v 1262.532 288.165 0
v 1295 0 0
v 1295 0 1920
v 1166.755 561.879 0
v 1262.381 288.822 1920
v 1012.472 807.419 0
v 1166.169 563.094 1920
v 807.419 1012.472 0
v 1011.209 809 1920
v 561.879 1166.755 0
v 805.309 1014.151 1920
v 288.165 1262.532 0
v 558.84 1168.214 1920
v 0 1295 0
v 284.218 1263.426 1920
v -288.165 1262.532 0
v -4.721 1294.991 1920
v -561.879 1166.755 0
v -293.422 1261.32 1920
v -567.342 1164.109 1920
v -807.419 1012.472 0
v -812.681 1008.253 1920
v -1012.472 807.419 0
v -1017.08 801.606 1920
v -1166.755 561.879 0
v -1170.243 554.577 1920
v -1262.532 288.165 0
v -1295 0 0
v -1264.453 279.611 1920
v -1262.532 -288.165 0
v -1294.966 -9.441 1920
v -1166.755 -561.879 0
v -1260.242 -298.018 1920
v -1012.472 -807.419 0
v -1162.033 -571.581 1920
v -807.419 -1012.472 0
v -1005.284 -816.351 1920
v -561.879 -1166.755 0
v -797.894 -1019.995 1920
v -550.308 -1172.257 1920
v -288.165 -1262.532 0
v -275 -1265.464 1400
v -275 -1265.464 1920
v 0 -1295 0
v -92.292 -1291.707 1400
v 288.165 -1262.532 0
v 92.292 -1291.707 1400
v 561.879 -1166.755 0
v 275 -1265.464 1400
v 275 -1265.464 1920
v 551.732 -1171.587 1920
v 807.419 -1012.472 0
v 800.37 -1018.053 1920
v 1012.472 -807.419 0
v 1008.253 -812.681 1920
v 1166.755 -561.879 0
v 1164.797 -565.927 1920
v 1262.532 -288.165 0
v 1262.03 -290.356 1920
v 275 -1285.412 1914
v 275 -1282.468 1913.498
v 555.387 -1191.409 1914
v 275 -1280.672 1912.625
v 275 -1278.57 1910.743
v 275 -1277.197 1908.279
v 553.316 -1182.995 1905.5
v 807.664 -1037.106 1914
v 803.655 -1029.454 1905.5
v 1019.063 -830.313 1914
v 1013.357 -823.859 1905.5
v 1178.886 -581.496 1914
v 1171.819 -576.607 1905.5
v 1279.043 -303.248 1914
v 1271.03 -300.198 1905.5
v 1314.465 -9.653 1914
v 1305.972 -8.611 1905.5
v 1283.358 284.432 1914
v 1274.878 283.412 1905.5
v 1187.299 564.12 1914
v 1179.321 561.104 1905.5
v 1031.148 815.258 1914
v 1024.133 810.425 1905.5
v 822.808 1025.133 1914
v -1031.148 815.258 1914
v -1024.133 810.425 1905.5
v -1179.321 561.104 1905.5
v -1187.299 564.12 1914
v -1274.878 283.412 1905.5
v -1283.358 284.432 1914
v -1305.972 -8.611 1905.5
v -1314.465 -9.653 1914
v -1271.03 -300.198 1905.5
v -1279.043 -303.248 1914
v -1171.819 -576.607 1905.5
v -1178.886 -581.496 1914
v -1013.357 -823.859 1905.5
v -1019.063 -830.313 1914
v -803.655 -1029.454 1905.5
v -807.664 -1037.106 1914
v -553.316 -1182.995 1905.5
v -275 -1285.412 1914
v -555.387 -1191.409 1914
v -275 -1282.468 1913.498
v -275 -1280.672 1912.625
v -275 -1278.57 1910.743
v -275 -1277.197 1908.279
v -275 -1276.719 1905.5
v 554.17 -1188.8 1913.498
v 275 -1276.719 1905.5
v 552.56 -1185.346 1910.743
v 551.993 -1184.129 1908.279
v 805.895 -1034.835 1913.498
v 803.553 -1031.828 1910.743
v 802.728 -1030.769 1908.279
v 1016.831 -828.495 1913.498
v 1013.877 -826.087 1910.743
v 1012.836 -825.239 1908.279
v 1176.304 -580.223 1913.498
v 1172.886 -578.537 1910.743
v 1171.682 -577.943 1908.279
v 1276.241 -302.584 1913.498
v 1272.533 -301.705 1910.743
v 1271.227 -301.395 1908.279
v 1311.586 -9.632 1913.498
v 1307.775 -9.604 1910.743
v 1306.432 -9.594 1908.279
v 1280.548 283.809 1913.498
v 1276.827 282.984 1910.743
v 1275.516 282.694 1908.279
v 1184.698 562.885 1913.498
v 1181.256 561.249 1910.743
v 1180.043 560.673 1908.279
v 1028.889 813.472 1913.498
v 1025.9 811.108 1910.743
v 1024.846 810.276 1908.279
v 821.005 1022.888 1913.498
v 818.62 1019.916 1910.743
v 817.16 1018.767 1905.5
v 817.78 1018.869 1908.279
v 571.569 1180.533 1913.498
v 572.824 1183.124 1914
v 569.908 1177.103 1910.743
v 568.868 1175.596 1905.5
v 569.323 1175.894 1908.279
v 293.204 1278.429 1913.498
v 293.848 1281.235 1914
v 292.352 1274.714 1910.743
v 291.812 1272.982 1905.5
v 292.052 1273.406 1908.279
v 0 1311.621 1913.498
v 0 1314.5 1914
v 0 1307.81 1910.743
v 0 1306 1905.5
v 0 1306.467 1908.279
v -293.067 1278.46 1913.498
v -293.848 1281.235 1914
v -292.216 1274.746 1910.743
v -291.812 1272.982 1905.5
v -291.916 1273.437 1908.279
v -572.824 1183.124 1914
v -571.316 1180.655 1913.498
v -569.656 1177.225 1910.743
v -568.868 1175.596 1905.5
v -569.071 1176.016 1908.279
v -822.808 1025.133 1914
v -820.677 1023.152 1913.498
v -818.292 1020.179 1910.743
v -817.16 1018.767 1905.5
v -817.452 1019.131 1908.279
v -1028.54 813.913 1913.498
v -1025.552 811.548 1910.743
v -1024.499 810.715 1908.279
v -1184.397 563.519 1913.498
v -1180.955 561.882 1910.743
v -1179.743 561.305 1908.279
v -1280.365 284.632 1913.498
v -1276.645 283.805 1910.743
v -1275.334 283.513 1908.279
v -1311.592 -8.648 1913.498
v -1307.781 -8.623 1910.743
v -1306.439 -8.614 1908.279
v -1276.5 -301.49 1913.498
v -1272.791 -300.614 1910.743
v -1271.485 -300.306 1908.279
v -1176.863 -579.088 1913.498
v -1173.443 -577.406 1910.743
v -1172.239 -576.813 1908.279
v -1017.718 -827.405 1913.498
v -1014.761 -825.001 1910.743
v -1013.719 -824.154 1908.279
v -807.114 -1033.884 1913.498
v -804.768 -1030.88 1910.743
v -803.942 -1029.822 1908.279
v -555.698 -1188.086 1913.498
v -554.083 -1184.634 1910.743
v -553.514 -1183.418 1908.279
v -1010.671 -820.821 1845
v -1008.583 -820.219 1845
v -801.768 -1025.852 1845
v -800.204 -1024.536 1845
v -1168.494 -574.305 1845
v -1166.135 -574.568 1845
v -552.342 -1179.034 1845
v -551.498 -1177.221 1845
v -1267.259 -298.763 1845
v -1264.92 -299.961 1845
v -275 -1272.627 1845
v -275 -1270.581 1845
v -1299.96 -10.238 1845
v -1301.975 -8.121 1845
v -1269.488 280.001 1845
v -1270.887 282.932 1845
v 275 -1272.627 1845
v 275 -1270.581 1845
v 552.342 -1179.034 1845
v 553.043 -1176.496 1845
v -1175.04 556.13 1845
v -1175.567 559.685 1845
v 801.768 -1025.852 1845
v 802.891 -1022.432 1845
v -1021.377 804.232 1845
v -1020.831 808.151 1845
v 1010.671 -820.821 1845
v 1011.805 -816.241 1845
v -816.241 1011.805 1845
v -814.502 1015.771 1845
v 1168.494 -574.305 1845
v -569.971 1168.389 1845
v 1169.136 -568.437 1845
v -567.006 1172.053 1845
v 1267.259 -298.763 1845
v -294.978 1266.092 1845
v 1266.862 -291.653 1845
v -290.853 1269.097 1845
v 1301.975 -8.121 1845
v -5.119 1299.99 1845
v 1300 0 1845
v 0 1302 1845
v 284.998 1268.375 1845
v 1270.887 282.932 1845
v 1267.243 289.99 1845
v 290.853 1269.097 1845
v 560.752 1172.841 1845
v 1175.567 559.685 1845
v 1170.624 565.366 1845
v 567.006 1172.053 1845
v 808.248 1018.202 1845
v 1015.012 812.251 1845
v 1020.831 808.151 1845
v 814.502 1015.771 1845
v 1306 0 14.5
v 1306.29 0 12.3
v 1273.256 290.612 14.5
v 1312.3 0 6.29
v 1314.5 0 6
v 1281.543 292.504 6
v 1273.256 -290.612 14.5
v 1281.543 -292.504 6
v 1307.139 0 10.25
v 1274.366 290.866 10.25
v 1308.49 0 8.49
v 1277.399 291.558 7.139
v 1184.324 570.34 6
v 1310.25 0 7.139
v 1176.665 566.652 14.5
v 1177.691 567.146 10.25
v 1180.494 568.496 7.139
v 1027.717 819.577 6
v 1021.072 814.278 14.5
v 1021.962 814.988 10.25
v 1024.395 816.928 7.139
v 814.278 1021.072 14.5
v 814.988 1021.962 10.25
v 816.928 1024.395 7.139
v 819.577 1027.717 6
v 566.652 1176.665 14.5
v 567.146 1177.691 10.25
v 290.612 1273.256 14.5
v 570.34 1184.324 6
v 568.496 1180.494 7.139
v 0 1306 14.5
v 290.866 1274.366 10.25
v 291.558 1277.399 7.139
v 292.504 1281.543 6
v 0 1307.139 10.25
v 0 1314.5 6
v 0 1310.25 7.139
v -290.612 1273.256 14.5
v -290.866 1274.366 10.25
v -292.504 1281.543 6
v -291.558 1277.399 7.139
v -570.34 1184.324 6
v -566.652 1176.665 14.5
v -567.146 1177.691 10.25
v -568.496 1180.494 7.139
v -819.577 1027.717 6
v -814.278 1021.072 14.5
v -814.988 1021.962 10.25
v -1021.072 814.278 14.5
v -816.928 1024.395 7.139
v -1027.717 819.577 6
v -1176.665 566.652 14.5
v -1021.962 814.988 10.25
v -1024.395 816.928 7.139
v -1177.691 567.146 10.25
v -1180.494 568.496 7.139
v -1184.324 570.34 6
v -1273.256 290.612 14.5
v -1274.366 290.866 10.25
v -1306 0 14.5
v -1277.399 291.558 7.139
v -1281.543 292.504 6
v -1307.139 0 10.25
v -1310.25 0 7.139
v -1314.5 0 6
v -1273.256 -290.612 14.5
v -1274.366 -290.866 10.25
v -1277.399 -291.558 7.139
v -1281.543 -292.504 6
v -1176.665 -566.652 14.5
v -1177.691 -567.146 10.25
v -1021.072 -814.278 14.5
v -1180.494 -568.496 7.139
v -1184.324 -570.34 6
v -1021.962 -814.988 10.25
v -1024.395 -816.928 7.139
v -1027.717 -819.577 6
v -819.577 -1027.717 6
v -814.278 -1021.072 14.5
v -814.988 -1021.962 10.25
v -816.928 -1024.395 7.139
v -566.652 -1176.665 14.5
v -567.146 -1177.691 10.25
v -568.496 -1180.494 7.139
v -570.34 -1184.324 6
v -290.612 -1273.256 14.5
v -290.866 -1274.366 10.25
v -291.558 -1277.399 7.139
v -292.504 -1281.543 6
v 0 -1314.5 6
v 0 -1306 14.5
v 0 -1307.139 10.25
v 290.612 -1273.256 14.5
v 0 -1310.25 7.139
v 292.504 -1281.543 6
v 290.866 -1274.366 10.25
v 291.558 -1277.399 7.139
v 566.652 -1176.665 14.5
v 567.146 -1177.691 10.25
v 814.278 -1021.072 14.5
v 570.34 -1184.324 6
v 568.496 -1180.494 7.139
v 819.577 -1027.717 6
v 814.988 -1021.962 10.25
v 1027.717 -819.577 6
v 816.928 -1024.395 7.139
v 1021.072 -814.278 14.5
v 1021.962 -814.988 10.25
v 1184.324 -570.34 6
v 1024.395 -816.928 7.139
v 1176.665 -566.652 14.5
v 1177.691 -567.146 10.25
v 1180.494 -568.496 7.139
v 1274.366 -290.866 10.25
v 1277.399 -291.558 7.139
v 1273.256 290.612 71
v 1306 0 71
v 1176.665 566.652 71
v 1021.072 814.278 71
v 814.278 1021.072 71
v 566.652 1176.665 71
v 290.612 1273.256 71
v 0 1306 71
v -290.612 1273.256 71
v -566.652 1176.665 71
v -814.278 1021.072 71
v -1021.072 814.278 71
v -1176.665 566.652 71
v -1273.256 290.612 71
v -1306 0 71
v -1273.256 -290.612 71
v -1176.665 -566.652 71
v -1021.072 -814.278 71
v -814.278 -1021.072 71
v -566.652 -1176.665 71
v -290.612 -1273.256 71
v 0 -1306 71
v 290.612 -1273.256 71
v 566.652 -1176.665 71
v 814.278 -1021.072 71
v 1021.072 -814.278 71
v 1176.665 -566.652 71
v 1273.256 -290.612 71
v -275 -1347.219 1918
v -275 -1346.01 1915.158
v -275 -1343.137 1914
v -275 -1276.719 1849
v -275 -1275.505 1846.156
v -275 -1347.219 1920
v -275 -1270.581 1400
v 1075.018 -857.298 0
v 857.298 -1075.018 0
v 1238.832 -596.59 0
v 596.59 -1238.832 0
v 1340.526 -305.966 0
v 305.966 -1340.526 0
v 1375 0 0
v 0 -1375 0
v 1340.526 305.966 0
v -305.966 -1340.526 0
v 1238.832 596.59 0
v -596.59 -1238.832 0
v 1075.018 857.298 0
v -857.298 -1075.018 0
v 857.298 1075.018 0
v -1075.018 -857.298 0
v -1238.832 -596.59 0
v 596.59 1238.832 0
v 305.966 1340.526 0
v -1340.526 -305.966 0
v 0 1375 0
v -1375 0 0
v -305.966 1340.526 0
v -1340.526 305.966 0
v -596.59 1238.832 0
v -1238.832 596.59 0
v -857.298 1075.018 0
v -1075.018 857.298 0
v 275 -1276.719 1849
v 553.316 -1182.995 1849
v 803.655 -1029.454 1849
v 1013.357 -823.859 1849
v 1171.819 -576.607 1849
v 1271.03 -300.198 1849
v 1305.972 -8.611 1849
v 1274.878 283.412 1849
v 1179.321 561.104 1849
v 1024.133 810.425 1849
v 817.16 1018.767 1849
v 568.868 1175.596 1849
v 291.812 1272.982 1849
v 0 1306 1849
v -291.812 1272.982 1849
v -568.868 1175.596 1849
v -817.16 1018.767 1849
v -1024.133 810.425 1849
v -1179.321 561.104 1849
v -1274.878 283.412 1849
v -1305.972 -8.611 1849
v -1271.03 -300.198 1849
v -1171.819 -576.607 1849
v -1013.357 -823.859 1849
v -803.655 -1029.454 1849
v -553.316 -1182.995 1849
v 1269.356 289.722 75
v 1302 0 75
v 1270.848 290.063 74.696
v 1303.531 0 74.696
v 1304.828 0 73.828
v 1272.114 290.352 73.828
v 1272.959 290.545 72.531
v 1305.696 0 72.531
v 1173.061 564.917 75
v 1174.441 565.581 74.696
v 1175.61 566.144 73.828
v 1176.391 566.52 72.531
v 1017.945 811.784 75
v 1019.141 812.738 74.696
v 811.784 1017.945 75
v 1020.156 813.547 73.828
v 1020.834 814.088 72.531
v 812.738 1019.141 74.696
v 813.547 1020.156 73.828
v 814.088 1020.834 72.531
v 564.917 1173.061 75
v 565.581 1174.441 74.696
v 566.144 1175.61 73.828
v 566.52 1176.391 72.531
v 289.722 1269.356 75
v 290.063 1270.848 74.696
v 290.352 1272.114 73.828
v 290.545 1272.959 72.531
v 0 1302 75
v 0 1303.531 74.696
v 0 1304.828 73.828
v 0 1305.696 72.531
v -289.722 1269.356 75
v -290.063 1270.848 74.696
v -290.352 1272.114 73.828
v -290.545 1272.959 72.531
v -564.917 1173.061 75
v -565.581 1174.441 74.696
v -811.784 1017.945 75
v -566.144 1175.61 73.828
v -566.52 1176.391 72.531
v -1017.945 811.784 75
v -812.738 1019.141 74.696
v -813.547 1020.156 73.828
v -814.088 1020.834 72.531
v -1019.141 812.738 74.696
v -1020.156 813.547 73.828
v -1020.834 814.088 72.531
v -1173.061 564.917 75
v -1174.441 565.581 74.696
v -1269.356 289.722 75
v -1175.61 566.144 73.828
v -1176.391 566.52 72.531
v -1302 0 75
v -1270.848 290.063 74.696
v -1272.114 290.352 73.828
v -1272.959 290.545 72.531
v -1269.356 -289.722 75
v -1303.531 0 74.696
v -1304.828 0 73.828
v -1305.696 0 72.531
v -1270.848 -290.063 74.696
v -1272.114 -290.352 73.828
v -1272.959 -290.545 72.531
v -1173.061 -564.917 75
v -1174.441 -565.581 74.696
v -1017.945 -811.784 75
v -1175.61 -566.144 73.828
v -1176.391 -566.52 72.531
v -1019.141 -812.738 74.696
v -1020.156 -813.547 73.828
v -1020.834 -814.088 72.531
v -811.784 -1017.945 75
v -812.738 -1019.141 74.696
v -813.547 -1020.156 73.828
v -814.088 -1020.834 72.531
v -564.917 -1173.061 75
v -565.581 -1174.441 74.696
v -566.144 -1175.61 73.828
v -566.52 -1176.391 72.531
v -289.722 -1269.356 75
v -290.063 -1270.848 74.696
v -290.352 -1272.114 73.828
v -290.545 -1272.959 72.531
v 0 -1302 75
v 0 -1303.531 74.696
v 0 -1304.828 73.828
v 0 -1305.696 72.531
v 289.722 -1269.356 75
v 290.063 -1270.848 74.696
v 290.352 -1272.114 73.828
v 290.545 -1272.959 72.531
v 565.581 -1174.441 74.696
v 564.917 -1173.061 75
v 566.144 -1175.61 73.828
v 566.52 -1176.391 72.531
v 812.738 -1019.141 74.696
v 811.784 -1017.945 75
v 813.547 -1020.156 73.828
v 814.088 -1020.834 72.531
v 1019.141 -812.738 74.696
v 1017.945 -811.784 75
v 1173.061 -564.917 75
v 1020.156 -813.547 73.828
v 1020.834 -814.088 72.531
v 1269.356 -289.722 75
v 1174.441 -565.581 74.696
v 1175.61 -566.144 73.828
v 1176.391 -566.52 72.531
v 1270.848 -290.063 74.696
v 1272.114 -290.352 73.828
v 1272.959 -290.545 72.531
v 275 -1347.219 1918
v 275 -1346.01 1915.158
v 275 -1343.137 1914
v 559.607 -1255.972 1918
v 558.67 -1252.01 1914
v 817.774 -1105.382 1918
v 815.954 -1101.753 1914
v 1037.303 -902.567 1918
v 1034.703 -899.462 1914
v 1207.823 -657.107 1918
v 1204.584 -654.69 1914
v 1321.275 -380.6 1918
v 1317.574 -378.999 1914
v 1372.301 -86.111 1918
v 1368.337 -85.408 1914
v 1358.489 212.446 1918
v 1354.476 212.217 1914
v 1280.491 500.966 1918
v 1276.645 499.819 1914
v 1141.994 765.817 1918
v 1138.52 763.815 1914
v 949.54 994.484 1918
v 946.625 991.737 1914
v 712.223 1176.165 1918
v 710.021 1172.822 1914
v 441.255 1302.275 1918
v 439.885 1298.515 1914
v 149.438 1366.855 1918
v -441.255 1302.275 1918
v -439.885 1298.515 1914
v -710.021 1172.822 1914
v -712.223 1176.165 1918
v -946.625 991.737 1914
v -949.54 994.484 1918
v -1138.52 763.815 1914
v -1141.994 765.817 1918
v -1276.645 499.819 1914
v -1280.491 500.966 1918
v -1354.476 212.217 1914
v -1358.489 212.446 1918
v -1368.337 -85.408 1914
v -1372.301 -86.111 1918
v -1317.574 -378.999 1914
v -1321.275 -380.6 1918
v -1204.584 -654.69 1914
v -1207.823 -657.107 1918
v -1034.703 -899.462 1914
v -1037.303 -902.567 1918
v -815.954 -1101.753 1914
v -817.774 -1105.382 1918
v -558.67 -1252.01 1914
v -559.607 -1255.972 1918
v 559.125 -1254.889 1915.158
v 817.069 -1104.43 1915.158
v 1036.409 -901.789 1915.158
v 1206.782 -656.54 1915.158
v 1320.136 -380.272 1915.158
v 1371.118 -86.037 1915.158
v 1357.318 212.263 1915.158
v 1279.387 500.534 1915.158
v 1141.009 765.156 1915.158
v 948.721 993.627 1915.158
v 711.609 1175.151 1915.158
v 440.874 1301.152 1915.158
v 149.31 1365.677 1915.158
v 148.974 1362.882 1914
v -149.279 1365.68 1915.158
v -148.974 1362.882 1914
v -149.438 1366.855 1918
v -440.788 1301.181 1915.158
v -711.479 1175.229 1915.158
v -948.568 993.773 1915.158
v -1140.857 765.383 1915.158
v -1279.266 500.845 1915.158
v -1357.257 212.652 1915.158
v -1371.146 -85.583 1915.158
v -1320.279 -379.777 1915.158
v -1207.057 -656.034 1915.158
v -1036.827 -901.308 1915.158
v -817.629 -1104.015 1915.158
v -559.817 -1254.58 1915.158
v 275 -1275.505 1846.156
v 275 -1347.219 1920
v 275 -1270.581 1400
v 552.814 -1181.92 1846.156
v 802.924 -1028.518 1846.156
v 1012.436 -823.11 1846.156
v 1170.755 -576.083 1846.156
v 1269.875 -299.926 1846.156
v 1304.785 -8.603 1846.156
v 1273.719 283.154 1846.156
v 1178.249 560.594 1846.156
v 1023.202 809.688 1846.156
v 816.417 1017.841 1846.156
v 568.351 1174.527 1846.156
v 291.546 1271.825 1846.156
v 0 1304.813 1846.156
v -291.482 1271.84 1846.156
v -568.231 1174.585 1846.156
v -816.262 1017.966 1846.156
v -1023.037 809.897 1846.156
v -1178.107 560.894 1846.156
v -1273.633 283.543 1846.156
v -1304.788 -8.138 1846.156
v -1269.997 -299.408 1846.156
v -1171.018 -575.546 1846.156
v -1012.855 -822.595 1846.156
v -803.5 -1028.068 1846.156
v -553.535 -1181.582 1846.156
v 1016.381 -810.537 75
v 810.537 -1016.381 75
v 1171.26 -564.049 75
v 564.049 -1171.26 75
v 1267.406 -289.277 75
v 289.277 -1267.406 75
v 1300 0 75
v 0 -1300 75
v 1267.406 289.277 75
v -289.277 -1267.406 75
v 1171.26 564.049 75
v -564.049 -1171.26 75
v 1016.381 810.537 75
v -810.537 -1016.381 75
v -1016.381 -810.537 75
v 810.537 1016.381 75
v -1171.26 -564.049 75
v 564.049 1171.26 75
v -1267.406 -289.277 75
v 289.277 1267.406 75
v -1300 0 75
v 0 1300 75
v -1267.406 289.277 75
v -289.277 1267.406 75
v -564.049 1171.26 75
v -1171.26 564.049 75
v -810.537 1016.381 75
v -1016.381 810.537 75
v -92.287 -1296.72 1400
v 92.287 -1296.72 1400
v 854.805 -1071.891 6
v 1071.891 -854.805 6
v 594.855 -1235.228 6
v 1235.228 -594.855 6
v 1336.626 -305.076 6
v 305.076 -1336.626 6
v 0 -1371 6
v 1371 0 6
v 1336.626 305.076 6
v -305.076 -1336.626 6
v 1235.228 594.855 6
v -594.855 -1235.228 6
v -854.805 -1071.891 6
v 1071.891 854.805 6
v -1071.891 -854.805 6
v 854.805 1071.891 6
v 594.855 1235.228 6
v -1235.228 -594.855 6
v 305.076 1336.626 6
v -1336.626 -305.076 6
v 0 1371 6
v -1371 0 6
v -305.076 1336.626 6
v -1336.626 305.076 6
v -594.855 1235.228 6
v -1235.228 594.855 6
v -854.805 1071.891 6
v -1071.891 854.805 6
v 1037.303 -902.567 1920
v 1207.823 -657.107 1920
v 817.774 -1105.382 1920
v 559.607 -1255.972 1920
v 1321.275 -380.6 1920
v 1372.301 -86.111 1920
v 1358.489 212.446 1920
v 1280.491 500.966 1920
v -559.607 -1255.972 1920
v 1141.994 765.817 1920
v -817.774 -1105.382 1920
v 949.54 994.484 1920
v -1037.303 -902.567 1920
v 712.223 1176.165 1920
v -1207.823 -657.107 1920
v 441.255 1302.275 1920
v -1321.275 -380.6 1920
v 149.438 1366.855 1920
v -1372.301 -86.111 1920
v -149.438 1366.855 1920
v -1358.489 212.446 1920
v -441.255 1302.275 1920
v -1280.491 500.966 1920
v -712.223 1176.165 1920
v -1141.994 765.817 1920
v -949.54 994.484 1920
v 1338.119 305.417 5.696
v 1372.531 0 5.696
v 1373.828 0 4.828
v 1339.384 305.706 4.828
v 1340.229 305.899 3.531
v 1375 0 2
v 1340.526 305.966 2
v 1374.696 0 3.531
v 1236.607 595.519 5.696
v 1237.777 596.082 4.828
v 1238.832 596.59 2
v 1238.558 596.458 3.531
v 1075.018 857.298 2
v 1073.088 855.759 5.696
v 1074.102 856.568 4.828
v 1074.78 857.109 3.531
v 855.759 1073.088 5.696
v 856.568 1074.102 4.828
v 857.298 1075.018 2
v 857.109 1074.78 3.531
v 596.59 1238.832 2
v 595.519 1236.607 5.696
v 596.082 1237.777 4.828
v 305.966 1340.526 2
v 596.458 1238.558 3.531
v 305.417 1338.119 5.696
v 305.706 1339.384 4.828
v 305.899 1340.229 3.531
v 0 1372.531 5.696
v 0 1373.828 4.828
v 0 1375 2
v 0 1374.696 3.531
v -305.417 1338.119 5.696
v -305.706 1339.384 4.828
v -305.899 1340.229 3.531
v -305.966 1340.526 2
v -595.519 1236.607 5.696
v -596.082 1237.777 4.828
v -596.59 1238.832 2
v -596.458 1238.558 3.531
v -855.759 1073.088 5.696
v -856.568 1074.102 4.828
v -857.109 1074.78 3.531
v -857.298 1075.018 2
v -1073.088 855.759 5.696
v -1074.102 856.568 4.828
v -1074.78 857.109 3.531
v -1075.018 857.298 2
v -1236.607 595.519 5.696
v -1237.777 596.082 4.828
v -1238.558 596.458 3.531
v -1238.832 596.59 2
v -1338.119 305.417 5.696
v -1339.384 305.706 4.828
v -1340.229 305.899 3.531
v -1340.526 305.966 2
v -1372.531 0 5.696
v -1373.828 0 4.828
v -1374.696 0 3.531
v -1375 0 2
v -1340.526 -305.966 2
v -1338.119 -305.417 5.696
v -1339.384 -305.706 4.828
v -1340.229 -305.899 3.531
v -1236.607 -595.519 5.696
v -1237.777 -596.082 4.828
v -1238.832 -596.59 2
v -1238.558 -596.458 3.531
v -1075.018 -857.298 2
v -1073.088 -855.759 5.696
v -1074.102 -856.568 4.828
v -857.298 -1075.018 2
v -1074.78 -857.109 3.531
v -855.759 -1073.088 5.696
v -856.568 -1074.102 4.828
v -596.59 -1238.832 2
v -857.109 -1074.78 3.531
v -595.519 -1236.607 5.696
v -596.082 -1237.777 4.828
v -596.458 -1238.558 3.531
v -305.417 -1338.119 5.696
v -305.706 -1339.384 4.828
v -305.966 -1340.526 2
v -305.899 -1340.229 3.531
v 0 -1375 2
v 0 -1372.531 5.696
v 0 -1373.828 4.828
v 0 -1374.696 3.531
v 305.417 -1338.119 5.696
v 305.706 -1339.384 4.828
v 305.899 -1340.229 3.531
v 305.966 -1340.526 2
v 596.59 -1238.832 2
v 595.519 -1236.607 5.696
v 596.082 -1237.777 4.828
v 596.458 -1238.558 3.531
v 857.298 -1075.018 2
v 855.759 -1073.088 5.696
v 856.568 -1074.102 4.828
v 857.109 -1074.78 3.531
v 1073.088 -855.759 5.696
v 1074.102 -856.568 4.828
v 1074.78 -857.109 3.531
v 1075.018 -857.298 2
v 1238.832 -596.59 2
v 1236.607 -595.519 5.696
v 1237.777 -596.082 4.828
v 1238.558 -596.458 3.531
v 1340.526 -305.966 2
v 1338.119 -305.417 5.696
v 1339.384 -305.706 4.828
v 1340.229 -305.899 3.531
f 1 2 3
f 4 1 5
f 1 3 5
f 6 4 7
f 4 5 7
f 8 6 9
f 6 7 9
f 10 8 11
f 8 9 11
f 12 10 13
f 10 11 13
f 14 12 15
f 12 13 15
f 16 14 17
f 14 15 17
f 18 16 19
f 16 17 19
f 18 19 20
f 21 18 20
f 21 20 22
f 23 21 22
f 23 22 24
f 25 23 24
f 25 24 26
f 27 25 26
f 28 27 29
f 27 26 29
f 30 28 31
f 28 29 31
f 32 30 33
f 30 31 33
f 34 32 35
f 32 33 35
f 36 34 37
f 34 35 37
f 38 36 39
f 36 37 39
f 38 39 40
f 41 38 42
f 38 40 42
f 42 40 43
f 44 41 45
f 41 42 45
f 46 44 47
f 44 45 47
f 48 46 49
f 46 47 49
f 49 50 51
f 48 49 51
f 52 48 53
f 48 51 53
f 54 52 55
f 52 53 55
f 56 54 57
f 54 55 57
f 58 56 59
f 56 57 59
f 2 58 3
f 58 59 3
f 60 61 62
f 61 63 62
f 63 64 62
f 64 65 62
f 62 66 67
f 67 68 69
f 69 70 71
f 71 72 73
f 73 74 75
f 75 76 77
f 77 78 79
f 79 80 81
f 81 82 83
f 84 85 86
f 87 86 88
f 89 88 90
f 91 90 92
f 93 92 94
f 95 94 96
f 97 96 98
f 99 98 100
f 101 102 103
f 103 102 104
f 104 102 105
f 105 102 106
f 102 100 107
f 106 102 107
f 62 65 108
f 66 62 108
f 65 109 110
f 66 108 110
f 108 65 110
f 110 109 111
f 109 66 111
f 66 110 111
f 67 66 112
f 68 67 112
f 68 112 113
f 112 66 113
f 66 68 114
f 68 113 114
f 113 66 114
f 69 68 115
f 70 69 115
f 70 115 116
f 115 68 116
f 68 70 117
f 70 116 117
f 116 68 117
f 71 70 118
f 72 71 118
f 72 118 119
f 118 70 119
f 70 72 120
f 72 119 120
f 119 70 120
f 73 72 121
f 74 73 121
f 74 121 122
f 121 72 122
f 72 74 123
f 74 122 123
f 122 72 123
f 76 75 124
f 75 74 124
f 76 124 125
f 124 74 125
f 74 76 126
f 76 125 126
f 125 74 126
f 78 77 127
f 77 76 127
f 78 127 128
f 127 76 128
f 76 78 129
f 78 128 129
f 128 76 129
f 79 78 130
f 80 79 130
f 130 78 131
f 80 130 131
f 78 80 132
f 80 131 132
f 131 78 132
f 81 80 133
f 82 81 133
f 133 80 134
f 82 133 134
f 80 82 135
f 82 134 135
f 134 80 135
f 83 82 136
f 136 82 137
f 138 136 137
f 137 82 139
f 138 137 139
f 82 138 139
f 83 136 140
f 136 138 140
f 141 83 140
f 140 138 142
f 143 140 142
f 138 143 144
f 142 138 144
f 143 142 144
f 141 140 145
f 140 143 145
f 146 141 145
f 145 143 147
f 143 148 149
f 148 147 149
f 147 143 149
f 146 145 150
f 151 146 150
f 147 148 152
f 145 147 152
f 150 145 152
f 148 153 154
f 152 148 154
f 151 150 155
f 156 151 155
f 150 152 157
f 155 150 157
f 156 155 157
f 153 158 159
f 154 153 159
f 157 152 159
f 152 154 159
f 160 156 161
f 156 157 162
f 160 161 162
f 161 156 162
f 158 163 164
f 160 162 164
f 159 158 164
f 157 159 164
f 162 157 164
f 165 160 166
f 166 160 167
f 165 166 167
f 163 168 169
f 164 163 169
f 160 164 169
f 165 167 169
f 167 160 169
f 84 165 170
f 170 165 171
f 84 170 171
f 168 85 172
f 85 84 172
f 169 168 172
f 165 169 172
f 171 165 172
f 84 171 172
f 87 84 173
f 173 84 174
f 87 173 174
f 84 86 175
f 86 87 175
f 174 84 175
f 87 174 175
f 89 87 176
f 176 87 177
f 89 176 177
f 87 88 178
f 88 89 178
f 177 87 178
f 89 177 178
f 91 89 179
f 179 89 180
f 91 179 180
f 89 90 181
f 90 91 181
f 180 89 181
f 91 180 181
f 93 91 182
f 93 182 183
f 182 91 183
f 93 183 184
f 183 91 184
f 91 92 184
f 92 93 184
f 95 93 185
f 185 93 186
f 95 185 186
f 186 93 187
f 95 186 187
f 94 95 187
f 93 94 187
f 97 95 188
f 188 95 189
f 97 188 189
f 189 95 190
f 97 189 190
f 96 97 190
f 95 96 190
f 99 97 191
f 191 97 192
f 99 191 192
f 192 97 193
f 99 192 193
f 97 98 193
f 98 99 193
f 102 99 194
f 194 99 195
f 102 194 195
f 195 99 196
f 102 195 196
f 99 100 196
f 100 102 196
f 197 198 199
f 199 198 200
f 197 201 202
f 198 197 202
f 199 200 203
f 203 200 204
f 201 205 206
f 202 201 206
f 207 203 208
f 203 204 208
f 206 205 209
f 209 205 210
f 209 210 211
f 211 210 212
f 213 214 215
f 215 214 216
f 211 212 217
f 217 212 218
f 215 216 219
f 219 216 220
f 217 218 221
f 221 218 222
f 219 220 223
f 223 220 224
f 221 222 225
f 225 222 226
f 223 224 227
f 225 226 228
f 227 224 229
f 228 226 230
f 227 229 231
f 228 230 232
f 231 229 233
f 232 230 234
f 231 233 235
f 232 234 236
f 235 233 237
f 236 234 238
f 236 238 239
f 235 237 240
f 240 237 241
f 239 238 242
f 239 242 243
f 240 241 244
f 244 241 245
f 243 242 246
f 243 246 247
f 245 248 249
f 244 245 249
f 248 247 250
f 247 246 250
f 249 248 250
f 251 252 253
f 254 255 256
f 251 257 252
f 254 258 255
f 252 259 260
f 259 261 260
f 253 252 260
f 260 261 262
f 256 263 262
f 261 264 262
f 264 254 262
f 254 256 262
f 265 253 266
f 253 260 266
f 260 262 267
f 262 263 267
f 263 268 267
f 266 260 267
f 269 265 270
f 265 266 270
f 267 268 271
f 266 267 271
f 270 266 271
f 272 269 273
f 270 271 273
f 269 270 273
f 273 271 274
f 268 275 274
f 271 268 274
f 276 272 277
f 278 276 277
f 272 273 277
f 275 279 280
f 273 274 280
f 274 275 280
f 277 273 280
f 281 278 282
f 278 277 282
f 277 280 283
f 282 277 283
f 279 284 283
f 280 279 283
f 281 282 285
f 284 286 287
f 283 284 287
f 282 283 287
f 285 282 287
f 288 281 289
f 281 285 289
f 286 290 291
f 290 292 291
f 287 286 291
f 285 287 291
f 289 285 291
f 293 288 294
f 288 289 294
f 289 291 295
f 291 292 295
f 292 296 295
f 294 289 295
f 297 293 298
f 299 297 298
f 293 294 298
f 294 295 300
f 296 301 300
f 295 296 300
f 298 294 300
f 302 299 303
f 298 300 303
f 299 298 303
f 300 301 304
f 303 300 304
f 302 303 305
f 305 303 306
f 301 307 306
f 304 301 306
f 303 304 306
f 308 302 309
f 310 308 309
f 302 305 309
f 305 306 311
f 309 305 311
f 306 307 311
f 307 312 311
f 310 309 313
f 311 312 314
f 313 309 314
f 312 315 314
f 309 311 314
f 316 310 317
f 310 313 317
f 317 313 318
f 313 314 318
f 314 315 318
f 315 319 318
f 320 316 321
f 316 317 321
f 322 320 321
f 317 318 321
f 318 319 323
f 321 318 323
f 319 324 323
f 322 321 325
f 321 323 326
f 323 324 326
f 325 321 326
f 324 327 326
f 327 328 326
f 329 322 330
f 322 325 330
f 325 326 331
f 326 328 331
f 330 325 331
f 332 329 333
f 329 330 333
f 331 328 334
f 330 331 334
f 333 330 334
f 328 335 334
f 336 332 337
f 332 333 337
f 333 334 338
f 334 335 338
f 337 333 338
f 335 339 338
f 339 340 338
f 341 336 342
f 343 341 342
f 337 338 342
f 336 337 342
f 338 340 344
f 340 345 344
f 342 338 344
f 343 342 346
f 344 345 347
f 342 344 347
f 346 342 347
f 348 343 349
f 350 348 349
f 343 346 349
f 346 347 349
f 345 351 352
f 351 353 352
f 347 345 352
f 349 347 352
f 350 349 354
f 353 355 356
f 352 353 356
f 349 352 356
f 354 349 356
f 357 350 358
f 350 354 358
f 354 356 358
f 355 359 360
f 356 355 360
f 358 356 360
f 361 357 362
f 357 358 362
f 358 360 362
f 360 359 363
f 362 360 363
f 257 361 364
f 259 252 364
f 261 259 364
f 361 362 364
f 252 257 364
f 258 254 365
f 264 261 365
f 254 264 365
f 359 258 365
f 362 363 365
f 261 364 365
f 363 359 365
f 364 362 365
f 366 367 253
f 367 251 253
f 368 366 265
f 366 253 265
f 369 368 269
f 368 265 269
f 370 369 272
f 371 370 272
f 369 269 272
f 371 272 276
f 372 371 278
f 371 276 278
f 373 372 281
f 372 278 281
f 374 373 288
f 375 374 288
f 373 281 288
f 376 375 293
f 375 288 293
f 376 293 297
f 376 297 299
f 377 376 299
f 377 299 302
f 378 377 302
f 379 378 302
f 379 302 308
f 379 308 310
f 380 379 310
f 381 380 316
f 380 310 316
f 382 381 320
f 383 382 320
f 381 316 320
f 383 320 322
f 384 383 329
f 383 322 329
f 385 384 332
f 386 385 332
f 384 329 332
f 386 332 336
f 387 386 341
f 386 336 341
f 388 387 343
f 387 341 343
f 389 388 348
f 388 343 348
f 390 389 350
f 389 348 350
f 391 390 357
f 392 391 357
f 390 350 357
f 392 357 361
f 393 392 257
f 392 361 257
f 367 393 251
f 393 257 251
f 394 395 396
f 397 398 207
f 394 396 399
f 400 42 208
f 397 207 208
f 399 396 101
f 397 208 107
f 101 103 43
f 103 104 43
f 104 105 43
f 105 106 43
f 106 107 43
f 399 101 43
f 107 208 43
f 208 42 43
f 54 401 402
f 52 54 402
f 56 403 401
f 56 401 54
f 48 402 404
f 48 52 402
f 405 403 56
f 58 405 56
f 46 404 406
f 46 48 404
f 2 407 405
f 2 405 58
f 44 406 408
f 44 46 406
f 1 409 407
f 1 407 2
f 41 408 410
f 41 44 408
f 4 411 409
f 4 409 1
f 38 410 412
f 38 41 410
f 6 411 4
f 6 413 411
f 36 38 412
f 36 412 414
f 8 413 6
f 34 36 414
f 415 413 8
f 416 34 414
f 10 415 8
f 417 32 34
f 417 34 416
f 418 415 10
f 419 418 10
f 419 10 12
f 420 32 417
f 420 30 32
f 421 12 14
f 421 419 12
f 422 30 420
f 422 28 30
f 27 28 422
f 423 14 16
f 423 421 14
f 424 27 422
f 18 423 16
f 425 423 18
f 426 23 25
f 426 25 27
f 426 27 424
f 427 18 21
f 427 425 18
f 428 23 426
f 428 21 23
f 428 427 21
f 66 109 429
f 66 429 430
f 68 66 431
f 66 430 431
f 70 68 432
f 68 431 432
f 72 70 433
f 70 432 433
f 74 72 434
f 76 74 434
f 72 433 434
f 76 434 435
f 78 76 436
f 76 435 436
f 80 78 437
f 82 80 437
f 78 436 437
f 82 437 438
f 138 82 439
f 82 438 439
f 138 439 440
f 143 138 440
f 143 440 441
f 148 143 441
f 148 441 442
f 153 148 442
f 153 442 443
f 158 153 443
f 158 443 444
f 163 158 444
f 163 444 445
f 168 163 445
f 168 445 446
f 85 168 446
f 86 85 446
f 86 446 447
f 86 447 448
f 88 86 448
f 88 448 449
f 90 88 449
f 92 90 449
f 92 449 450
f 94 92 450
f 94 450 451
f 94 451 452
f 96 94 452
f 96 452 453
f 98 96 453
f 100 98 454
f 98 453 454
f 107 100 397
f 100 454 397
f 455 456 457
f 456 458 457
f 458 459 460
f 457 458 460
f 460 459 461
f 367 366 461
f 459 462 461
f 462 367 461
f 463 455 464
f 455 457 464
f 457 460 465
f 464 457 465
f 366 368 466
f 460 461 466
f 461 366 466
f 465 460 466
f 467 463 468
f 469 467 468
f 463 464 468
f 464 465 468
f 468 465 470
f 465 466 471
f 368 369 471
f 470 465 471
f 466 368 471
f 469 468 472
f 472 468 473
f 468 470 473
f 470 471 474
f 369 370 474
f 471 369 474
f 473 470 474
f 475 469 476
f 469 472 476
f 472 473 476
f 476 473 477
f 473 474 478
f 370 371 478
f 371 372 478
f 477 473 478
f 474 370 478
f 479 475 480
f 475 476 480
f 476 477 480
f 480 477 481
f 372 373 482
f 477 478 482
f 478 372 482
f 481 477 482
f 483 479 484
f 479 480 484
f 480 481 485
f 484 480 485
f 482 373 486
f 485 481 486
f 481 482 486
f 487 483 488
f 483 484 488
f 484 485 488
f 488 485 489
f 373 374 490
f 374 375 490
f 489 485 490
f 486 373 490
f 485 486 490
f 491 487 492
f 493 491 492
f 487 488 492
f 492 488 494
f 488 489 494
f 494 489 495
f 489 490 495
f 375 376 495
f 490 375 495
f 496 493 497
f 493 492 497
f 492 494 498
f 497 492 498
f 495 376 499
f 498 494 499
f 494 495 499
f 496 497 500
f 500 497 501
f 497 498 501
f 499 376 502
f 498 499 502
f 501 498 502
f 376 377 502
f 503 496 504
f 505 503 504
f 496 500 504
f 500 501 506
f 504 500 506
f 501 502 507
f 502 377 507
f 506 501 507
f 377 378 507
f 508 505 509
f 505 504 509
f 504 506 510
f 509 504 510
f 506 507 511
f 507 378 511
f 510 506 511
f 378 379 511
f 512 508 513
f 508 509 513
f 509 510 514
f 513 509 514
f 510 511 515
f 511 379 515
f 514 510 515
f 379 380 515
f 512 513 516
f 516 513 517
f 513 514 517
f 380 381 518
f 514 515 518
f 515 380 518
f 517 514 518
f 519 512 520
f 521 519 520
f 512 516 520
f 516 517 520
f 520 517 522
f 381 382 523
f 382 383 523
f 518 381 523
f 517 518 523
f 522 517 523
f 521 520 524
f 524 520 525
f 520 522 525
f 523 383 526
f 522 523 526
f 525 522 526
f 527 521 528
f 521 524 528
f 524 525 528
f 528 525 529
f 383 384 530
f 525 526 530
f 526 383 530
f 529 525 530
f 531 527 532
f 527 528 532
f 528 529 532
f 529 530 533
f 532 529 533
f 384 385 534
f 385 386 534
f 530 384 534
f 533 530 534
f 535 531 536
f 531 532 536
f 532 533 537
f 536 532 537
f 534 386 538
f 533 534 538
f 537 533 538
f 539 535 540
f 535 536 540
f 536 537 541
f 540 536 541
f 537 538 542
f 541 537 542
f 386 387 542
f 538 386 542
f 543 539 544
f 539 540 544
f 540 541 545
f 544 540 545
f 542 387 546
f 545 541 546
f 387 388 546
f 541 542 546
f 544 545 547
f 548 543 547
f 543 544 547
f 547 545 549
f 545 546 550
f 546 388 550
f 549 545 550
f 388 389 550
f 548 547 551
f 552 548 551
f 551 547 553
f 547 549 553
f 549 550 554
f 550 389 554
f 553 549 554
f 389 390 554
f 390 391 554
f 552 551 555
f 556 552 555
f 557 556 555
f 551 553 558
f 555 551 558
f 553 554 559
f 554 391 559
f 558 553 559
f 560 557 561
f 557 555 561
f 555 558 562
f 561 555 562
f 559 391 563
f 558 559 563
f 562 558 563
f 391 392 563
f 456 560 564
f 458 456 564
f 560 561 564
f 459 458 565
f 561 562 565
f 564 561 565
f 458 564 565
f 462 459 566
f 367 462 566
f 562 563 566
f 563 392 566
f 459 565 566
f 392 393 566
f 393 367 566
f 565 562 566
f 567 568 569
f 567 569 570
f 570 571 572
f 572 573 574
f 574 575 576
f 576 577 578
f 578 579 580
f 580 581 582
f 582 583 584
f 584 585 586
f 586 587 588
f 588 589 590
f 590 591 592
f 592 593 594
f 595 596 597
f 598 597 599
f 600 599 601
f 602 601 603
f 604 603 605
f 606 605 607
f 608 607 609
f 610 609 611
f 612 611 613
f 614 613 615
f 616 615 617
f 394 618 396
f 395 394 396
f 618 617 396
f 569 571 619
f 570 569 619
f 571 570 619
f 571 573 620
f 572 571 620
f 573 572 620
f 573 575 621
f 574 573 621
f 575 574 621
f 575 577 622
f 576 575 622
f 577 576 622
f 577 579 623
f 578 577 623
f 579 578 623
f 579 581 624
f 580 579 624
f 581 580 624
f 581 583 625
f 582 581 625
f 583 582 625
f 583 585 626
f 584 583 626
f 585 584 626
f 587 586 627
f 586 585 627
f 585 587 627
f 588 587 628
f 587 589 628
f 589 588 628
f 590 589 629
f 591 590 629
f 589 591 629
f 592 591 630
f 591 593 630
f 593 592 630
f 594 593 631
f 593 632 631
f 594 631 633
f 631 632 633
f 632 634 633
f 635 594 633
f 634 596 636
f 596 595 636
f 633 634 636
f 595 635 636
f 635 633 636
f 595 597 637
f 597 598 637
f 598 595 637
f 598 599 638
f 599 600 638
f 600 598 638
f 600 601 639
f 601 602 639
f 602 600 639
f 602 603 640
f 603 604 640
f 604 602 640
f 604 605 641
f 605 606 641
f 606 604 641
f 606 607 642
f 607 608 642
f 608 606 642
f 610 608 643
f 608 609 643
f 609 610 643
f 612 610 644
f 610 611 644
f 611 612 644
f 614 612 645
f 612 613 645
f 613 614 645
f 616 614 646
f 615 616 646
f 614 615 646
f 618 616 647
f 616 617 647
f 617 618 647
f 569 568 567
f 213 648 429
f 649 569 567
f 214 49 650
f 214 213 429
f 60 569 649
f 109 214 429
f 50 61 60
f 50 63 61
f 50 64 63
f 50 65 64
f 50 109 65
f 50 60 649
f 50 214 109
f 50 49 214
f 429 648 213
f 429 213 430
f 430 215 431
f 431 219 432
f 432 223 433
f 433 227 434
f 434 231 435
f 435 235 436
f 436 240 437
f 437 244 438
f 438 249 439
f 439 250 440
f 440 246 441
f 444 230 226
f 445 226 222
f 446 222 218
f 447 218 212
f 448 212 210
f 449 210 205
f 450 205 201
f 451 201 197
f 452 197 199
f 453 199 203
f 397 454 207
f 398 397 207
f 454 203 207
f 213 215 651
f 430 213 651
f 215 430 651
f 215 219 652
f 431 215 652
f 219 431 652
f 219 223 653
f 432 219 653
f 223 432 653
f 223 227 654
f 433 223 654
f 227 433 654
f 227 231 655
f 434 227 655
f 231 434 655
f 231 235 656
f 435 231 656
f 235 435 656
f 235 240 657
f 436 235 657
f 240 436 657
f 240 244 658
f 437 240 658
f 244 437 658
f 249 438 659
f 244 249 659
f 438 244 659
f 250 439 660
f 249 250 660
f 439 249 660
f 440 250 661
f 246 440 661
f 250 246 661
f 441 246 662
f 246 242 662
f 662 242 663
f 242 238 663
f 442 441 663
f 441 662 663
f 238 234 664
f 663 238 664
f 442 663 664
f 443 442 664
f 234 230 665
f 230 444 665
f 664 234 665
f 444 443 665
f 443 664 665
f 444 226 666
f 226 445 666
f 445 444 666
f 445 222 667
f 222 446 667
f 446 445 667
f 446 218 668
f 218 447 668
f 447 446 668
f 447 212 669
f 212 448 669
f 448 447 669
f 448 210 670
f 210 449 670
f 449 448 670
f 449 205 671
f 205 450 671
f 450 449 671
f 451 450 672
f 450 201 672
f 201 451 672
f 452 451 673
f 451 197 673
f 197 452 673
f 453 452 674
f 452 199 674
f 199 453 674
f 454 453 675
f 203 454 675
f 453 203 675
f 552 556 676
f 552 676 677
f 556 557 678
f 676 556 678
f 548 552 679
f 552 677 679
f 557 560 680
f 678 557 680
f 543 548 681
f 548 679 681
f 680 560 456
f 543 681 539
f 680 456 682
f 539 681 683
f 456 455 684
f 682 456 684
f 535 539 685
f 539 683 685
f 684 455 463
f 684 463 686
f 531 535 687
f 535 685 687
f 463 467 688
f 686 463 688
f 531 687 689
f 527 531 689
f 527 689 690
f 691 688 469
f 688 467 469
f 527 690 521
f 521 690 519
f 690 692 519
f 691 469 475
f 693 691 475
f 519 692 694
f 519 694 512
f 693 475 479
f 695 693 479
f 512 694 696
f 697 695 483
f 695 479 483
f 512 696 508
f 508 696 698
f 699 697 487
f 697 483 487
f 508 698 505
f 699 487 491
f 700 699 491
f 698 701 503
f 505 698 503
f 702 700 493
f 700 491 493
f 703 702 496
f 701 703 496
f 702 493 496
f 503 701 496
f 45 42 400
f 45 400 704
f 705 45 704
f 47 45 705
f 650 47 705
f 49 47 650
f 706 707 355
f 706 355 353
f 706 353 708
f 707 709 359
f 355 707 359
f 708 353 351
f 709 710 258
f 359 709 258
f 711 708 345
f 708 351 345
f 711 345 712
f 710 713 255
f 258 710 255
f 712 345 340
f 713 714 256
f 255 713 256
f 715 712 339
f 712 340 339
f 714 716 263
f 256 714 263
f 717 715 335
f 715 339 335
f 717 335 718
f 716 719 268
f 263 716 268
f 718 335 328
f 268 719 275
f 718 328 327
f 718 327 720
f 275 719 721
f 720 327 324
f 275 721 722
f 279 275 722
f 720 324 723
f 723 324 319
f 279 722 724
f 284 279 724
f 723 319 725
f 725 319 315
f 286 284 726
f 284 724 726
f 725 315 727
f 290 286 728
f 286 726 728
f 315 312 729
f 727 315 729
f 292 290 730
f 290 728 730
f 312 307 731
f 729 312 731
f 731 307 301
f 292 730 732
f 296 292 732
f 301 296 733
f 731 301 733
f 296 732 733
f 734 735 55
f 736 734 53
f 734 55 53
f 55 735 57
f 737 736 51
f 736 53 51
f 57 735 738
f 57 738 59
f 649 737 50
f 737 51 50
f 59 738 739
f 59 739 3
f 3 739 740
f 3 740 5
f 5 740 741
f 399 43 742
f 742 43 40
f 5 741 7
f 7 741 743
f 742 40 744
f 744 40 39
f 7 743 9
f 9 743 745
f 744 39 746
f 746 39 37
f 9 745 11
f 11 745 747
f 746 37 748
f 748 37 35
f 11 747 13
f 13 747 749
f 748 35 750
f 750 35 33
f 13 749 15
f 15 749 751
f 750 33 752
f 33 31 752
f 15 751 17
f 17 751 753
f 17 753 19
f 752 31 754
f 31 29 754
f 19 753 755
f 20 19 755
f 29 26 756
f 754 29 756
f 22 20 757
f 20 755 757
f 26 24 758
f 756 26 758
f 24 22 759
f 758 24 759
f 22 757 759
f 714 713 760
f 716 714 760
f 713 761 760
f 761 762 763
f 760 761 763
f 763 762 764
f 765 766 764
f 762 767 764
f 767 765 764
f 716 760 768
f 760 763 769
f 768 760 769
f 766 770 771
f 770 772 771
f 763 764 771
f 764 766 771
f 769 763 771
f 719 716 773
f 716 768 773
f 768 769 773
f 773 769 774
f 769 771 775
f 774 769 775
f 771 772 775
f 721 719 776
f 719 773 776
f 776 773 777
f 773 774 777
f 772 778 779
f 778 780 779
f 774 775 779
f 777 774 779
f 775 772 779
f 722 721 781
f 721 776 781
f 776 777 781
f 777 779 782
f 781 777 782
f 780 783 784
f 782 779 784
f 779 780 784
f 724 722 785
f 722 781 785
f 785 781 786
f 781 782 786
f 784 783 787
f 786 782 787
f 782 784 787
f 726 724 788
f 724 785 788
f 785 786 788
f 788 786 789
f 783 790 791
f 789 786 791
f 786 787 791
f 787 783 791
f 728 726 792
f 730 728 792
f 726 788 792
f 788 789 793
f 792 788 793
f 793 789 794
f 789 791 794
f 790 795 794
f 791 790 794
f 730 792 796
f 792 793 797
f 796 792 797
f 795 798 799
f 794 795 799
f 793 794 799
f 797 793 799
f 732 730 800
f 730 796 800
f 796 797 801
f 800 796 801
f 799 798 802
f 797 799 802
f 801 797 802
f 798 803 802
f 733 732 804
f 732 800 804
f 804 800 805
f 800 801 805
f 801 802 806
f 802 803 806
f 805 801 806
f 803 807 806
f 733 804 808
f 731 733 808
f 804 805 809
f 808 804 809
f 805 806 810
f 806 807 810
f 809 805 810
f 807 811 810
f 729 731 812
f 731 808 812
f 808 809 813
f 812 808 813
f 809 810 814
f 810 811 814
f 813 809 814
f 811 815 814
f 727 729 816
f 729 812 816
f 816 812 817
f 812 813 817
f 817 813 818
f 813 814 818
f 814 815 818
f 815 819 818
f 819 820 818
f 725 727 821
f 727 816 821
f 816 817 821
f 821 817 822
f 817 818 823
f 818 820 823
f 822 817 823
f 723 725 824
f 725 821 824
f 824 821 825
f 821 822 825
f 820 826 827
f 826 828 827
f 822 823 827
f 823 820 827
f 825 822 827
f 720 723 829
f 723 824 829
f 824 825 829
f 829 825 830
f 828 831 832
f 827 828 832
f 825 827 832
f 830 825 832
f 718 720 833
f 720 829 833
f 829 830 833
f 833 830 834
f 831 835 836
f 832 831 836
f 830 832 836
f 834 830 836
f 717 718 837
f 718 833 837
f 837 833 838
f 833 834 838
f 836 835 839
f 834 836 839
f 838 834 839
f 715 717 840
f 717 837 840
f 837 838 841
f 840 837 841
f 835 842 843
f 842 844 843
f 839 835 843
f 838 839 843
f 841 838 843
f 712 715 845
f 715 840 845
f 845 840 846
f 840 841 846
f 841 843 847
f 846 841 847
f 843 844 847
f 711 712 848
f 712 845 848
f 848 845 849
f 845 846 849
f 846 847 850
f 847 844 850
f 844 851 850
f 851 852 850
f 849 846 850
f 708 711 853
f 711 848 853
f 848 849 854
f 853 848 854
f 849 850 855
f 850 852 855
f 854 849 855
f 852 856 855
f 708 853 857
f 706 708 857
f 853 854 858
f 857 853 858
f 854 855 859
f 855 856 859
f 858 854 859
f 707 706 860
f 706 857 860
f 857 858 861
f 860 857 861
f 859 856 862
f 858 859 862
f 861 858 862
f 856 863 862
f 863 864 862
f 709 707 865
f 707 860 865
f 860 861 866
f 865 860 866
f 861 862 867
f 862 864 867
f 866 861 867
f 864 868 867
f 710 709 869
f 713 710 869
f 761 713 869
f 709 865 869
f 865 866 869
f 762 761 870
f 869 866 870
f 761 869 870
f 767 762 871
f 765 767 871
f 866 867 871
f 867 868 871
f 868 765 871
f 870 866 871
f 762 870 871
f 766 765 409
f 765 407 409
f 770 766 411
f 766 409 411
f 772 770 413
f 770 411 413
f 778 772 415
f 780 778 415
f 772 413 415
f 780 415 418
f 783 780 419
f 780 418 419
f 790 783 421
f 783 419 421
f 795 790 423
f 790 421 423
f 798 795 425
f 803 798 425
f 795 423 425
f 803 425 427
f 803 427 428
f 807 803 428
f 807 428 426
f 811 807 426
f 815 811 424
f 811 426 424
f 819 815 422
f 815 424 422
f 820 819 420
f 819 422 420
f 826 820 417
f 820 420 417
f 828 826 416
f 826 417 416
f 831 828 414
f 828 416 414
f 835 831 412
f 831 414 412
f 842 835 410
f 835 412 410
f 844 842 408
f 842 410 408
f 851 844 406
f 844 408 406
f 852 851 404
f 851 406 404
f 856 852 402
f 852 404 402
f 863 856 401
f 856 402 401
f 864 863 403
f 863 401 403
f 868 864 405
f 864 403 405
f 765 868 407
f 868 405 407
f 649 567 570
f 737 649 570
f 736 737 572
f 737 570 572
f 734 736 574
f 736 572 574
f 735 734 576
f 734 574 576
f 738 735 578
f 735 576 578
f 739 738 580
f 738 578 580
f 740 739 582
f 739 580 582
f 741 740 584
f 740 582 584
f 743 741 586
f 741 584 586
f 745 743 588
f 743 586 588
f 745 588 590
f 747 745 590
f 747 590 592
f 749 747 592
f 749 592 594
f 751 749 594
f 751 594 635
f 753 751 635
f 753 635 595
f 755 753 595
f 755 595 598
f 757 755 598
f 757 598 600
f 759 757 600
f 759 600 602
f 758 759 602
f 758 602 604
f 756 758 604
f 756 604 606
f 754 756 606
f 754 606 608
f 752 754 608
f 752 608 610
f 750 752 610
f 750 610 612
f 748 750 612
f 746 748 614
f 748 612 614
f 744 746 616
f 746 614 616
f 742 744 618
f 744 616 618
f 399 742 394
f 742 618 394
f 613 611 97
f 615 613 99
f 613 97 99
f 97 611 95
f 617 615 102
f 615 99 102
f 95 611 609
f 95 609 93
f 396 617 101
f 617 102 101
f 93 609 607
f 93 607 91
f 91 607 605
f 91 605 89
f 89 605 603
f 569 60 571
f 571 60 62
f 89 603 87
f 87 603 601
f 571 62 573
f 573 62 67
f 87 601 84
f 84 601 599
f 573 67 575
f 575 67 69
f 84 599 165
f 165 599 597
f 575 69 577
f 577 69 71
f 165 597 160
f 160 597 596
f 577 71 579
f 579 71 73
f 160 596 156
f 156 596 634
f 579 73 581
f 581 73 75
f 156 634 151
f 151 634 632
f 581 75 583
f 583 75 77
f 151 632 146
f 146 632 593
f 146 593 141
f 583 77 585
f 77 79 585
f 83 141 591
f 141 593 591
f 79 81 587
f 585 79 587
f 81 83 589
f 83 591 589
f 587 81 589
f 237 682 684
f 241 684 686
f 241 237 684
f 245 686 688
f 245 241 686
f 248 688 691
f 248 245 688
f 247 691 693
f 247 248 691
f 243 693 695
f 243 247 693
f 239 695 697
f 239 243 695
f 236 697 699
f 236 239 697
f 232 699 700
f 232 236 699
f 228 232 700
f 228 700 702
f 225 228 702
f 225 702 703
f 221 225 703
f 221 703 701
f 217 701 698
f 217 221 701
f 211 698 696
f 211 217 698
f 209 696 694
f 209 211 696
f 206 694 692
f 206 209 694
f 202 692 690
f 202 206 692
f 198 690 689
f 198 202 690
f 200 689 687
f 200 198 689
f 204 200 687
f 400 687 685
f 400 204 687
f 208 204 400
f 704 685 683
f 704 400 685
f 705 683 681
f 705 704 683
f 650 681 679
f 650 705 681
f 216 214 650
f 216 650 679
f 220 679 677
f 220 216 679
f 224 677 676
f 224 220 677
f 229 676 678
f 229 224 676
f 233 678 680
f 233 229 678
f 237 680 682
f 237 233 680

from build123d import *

# Parameters (mm, degrees)
SKETCH001_W   = 550
SKETCH001_H   = 520
EXTRUDE_DEPTH = 1700
SKETCH_W      = 5
SKETCH_H      = 1920


with BuildPart() as extrude_body:
    # Sketch001 → Extrude (new body)
    with BuildSketch(Plane.XZ):
        with Locations((0, 1660)):
            Rectangle(SKETCH001_W, SKETCH001_H)
    extrude(amount=EXTRUDE_DEPTH)


with BuildPart() as revolve001:
    # AngleSteel → Revolve001 (revolve)
    with BuildSketch(Plane(origin=(1320.58985, 0, 20.58985), x_dir=(1, 0, 0), z_dir=(0, 1, 0))):
        with BuildLine():
            Line((-20.58985, 20.58985), (-20.58985, -54.41015))
            Line((-20.58985, -54.41015), (-18.58985, -54.41015))
            ThreePointArc((-18.58985, -54.41015), (-15.761423, -53.238577), (-14.58985, -50.41015))
            Line((-14.58985, -50.41015), (-14.58985, 6.08985))
            ThreePointArc((-14.58985, 6.08985), (-12.100258, 12.100258), (-6.08985, 14.58985))
            Line((-6.08985, 14.58985), (50.41015, 14.58985))
            ThreePointArc((50.41015, 14.58985), (53.238577, 15.761423), (54.41015, 18.58985))
            Line((54.41015, 18.58985), (54.41015, 20.58985))
            Line((54.41015, 20.58985), (-20.58985, 20.58985))
        make_face()
    revolve(axis=Axis((0, 0, 0), (0, 0, 1)))


with BuildPart() as revolve002:
    # AngleSteel001 → Revolve002 (revolve)
    with BuildSketch(Plane(origin=(1320.58985, 0, 1899.41015), x_dir=(1, 0, 0), z_dir=(0, 1, 0))):
        with BuildLine():
            Line((-20.58985, -20.58985), (54.41015, -20.58985))
            Line((54.41015, -20.58985), (54.41015, -18.58985))
            ThreePointArc((54.41015, -18.58985), (53.238577, -15.761423), (50.41015, -14.58985))
            Line((50.41015, -14.58985), (-6.08985, -14.58985))
            ThreePointArc((-6.08985, -14.58985), (-12.100258, -12.100258), (-14.58985, -6.08985))
            Line((-14.58985, -6.08985), (-14.58985, 50.41015))
            ThreePointArc((-14.58985, 50.41015), (-15.761423, 53.238577), (-18.58985, 54.41015))
            Line((-18.58985, 54.41015), (-20.58985, 54.41015))
            Line((-20.58985, 54.41015), (-20.58985, -20.58985))
        make_face()
    revolve(axis=Axis((0, 0, 0), (0, 0, 1)))


with BuildPart() as cut:
    # Sketch → Revolve (revolve)
    with BuildSketch(Plane.XZ):
        with Locations((1297.5, 960)):
            Rectangle(SKETCH_W, SKETCH_H)
    revolve(axis=Axis((0, 0, 0), (0, 0, 1)))

    # Fusion: union Revolve001, Revolve002
    add(revolve001.part)
    add(revolve002.part)

    # Cut: cut Extrude body
    add(extrude_body.part, mode=Mode.SUBTRACT)


solid = cut.part
